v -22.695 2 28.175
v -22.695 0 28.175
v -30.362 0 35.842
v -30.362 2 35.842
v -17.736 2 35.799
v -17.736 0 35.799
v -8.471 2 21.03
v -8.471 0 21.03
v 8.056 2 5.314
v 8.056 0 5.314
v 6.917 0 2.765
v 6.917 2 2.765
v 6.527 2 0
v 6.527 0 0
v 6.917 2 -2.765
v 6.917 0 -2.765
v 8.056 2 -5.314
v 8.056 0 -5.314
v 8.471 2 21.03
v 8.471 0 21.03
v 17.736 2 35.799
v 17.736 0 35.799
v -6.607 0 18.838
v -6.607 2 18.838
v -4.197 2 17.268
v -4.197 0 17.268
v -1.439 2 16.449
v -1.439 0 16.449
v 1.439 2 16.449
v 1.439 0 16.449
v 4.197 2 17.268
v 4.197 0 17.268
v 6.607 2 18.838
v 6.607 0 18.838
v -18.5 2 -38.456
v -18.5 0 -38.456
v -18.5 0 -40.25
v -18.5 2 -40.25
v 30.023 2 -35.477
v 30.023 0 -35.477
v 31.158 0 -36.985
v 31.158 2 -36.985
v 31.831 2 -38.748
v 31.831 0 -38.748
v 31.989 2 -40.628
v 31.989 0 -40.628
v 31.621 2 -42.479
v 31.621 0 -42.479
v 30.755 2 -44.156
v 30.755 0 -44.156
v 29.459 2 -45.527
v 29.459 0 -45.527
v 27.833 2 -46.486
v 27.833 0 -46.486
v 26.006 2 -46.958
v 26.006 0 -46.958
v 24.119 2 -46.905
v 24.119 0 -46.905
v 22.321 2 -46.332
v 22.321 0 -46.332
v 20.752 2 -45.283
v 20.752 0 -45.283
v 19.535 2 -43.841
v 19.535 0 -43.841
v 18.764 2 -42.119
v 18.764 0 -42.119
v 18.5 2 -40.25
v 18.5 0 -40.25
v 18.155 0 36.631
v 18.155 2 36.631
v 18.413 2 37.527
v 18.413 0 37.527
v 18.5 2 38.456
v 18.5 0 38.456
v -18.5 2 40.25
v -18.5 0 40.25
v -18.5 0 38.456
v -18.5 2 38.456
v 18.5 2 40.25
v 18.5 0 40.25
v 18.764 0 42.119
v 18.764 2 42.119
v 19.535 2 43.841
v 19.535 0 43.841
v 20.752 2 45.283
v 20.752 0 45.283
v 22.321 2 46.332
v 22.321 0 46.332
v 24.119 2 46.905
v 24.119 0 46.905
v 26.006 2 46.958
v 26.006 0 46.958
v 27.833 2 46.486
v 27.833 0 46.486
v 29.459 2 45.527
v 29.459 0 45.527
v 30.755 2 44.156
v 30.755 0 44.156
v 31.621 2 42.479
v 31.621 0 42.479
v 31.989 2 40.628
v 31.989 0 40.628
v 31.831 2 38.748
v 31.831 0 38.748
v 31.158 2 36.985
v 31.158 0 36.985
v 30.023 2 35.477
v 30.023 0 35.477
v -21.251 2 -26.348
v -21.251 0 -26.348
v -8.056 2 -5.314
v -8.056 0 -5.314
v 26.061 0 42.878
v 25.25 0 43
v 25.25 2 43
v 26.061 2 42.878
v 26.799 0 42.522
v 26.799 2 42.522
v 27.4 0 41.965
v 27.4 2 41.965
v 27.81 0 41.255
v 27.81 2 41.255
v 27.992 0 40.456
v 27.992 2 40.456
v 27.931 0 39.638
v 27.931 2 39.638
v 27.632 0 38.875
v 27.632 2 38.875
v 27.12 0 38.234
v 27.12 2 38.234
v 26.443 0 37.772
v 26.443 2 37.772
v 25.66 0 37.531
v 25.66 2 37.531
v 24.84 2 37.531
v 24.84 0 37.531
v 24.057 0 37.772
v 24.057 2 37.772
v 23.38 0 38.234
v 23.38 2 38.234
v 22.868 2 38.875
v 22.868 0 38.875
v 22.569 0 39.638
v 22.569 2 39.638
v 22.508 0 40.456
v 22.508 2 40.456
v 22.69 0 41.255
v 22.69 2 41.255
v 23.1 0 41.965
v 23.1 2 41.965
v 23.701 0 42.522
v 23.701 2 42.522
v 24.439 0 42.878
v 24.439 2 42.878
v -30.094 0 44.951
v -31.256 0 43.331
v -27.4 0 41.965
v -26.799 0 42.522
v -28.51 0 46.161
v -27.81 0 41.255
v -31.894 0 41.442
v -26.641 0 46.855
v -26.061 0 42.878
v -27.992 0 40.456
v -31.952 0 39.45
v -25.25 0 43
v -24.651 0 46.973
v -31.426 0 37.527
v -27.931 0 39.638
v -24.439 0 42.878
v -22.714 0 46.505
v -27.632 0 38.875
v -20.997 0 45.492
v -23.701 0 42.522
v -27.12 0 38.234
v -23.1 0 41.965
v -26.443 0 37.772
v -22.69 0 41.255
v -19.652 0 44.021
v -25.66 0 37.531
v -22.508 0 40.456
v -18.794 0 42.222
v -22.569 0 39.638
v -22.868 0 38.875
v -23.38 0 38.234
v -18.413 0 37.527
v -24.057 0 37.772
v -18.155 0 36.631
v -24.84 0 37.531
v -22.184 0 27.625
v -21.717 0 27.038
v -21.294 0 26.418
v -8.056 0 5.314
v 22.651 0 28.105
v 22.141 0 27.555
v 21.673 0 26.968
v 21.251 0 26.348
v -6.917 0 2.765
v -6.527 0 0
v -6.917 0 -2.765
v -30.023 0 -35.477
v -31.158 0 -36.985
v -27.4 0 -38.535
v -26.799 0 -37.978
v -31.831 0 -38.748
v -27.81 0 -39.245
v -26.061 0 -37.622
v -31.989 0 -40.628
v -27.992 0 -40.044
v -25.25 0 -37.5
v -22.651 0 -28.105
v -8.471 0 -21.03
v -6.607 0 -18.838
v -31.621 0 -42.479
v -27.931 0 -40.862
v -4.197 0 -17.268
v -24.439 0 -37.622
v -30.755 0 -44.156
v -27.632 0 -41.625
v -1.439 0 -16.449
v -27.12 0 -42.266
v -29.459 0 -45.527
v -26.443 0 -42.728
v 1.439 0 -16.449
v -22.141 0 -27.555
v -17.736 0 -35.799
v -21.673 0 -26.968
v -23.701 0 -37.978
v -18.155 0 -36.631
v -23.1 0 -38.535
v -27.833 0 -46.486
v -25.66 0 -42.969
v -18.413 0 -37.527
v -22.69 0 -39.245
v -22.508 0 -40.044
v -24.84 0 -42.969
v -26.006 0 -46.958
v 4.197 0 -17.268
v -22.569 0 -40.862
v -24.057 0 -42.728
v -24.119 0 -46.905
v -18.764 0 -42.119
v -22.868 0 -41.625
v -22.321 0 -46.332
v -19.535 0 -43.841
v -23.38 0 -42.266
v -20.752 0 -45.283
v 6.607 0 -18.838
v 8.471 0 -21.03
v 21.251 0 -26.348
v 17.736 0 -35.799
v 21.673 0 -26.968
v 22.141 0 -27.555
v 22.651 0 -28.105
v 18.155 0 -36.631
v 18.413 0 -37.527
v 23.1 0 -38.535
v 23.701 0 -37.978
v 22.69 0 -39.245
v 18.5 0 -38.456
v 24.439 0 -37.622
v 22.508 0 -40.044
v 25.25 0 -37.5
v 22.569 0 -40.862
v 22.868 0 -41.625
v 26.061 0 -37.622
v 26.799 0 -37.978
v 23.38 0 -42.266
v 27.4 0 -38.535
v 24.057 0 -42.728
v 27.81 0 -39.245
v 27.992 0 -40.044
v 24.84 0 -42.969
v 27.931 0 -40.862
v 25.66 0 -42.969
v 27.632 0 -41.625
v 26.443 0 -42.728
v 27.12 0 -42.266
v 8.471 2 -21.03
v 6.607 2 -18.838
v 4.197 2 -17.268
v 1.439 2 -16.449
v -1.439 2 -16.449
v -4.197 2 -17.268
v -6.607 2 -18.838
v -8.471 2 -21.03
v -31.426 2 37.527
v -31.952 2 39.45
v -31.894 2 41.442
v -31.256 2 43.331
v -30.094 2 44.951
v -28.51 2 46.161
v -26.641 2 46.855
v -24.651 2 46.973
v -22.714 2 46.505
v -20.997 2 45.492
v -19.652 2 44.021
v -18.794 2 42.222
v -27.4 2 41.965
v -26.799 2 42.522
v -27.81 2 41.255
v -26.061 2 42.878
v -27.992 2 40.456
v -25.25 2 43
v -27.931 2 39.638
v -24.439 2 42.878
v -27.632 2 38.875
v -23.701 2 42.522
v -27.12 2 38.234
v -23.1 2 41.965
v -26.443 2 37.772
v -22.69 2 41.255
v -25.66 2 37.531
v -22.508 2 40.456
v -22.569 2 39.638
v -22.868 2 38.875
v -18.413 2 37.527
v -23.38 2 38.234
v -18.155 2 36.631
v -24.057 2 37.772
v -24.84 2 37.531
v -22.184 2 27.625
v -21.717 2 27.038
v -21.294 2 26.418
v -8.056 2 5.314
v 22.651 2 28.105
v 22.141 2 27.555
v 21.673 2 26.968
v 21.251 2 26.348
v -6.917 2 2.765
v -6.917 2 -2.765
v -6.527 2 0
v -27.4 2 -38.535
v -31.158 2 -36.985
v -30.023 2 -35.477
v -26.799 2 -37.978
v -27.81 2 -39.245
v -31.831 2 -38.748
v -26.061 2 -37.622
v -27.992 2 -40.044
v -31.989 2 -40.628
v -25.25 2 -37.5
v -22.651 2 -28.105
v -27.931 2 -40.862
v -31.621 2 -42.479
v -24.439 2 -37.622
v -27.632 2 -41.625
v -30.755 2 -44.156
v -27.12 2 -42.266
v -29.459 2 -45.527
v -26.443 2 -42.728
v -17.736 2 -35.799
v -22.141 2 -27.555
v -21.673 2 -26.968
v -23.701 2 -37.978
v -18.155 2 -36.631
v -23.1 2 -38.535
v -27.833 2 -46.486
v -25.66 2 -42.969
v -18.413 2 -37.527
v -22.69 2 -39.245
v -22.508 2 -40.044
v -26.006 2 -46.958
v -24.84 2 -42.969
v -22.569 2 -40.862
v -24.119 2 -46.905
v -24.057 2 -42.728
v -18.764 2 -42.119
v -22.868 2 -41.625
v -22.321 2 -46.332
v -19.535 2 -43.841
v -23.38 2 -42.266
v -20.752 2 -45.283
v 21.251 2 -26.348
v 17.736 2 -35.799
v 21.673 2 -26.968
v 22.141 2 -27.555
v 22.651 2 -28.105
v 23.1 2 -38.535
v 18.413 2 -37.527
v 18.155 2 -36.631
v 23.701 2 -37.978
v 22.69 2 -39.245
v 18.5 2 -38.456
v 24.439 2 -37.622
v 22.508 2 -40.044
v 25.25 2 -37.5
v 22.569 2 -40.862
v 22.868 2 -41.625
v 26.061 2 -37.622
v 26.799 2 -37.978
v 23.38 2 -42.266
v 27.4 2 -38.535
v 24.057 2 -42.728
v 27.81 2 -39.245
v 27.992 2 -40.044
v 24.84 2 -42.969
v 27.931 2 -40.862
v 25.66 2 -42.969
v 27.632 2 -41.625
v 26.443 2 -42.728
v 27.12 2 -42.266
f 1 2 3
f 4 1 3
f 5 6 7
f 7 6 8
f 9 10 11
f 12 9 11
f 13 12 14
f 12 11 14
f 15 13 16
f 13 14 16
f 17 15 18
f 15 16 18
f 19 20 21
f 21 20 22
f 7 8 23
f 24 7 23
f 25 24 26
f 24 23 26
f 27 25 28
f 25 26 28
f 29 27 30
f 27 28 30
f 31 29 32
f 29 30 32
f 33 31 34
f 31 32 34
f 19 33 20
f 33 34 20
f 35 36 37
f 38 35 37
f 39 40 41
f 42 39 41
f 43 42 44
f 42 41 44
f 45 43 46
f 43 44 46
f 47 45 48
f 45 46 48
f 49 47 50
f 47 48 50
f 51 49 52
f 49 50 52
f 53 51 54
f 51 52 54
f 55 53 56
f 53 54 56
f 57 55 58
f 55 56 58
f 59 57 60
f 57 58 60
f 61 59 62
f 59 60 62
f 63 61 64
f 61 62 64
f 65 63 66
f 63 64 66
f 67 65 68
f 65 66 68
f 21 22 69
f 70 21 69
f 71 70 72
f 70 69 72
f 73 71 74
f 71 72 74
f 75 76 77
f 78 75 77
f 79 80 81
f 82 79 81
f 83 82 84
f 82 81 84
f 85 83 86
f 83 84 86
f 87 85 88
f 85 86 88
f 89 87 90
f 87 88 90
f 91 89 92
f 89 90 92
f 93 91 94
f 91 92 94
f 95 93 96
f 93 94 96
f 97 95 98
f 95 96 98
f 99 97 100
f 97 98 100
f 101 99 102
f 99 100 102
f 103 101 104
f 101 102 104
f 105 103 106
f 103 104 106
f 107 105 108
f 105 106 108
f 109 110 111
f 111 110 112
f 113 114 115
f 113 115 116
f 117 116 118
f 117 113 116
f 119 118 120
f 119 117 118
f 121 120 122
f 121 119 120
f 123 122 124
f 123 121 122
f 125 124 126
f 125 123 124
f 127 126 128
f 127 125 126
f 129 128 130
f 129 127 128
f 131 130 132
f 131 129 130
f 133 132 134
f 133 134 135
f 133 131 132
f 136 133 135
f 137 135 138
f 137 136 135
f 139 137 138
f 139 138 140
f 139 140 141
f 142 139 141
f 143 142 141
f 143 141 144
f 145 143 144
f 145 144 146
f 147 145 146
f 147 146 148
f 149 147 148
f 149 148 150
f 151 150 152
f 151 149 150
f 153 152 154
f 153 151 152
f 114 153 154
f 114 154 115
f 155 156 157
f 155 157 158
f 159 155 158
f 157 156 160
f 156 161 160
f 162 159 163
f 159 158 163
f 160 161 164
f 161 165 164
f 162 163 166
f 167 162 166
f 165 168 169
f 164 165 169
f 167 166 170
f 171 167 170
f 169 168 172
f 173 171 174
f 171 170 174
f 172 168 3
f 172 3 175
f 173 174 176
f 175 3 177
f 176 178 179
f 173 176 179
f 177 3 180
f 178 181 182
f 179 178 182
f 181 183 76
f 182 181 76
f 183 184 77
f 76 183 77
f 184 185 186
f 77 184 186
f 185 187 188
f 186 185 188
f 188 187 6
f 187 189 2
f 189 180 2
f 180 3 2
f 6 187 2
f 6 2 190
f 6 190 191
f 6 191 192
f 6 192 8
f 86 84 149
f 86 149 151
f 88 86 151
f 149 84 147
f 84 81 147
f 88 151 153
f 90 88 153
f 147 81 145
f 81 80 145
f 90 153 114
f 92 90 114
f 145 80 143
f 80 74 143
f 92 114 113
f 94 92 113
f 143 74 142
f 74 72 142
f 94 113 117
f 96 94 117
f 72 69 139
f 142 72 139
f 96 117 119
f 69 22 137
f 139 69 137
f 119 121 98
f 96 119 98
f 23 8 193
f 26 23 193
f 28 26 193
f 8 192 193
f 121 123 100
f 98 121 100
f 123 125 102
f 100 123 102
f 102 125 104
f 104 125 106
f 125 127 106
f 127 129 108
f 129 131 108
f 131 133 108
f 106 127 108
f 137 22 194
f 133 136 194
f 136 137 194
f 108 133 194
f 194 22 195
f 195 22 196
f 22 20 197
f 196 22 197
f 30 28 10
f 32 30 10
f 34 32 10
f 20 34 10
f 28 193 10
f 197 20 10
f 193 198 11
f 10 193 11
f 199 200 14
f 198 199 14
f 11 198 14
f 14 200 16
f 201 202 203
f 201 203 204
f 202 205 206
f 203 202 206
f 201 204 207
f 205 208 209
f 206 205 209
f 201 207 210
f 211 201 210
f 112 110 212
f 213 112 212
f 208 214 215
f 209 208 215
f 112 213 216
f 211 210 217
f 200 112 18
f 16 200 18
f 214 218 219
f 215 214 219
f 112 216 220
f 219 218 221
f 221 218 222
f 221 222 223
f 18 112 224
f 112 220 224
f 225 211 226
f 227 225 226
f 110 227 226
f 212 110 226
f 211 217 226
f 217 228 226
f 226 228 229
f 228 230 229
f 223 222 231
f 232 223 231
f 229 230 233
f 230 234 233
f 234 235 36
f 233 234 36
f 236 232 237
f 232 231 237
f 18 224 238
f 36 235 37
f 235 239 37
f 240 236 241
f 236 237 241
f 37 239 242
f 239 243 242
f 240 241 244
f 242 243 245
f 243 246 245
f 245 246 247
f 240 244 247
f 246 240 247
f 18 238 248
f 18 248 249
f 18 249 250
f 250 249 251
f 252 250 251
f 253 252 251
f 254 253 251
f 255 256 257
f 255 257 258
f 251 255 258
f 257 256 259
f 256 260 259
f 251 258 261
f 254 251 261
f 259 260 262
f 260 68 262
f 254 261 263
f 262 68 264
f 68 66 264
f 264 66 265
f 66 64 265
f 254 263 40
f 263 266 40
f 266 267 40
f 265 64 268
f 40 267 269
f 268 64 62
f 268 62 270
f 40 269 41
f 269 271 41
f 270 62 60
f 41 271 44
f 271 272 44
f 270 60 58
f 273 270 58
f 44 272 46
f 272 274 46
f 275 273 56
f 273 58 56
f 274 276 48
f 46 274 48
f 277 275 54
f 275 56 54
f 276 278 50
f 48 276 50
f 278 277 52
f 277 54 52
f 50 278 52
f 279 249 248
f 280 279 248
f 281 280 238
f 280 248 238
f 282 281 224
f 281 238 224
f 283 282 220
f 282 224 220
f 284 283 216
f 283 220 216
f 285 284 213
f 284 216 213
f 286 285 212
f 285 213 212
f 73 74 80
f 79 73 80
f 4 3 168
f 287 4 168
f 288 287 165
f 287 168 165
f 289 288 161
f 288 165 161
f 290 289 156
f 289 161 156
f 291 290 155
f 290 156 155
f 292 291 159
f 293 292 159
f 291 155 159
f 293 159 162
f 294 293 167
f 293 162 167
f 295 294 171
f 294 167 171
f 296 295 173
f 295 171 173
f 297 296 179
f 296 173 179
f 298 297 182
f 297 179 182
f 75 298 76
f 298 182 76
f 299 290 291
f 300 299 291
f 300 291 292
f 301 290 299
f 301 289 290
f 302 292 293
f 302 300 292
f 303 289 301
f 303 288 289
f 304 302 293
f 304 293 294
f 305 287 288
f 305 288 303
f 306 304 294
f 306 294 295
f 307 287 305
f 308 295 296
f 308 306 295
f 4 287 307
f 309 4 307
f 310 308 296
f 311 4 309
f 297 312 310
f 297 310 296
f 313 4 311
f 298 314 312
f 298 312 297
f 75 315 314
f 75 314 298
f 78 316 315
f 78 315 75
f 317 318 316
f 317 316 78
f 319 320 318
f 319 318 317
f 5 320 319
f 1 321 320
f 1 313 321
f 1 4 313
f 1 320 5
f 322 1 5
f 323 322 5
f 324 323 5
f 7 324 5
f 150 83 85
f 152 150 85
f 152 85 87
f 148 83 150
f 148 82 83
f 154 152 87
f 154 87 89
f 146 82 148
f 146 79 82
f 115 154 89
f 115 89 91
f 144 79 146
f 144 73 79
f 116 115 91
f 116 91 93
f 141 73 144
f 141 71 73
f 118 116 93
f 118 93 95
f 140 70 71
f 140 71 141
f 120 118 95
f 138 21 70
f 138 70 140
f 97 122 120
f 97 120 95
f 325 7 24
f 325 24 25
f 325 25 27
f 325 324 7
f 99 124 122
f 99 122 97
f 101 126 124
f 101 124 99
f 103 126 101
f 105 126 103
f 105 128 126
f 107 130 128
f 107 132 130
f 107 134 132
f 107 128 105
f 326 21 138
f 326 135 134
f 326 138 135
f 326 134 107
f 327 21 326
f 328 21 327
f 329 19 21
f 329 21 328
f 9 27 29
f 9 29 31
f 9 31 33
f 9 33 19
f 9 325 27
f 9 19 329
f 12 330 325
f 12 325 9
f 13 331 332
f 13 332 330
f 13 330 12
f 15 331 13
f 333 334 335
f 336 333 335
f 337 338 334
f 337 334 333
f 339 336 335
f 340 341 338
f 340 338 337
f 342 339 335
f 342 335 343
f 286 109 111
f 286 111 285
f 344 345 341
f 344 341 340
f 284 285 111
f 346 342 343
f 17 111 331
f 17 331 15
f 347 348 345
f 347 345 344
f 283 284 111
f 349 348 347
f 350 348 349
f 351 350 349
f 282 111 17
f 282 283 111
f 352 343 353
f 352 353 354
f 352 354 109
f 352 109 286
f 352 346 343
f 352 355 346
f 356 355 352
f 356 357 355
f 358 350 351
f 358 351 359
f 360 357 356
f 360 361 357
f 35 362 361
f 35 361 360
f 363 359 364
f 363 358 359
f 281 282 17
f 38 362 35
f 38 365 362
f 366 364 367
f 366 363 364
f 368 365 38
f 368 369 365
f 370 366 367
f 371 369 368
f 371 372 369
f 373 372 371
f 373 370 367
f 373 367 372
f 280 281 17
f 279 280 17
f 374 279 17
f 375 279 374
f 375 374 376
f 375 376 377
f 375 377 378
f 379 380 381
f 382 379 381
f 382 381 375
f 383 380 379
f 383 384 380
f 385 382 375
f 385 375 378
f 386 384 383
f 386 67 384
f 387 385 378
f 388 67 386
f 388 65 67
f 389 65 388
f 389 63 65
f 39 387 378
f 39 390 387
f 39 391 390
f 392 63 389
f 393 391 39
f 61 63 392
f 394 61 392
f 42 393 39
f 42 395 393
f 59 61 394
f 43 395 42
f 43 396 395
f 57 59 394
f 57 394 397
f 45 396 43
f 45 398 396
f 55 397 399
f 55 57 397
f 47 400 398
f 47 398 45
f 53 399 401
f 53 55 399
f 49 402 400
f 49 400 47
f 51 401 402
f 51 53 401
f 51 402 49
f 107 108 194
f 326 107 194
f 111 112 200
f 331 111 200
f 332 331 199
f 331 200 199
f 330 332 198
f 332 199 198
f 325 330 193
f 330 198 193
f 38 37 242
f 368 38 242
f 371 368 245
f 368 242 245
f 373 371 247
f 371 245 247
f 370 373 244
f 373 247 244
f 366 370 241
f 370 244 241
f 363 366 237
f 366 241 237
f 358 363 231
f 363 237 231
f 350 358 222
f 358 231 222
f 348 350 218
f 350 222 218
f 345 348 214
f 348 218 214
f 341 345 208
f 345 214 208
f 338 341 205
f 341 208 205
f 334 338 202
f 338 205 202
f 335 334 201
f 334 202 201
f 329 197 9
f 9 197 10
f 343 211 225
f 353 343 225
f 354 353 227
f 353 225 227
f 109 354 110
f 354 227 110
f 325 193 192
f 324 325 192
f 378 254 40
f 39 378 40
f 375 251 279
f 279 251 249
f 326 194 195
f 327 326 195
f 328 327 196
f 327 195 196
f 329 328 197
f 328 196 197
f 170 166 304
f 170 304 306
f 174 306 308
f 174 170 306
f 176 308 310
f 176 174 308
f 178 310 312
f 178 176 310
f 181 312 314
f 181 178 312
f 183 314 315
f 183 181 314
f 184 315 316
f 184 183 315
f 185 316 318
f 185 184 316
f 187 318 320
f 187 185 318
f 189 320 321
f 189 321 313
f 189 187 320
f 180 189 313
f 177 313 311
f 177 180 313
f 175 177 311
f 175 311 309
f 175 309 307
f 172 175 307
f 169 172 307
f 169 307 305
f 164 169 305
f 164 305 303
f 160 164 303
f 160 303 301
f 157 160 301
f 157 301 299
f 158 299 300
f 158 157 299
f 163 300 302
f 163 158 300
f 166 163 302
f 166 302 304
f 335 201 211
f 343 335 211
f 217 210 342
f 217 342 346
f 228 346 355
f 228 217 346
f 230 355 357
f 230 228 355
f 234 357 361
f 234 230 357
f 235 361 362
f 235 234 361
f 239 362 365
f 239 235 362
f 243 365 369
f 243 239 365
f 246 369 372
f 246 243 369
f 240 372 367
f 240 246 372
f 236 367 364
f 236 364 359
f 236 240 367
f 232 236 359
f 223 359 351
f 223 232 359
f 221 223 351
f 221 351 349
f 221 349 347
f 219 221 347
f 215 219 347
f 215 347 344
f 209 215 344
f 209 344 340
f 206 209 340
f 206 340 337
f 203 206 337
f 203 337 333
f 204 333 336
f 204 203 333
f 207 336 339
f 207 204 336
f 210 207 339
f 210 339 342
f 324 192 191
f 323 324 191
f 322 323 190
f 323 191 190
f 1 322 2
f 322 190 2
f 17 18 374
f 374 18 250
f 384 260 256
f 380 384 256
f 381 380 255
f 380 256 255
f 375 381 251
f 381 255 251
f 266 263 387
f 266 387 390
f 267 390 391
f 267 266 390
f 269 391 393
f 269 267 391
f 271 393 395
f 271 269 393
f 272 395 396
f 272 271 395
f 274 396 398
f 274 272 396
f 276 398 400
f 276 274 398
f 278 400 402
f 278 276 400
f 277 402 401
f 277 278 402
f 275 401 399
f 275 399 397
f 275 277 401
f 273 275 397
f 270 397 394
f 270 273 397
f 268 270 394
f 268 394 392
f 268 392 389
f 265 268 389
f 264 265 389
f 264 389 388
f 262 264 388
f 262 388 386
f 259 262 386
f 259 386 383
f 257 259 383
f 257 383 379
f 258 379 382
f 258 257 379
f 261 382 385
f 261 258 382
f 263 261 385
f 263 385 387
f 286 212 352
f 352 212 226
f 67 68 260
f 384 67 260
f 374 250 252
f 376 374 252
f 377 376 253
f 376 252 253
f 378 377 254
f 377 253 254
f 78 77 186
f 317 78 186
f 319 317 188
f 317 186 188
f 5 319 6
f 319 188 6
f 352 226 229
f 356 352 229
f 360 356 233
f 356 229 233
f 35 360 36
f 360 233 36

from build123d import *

# Parameters (mm, degrees)
SKETCH1_R           = 2.75
BOSS_EXTRUDE1_DEPTH = 2


with BuildPart() as part:
    # Sketch1 → Boss-Extrude1 (new body)
    with BuildSketch(Plane(origin=(0, 0, 0), x_dir=(1, 0, 0), z_dir=(0, 1, 0))):
        with BuildLine():
            ThreePointArc((-22.650842333, 28.104900787), (-21.901331942, 27.26589175), (-21.250806764, 26.34800342))
            Line((-21.250806764, 26.34800342), (-8.055669308, 5.314170444))
            ThreePointArc((-8.055669308, 5.314170444), (-6.526772689, 0), (-8.055669308, -5.314170444))
            Line((-8.055669308, -5.314170444), (-21.294498712, -26.41765098))
            ThreePointArc((-21.294498712, -26.41765098), (-21.94502389, -27.33553931), (-22.694534281, -28.174548348))
            Line((-22.694534281, -28.174548348), (-30.36172718, -35.841741247))
            ThreePointArc((-30.36172718, -35.841741247), (-27.601418884, -46.577189679), (-18.5, -40.25))
            Line((-18.5, -40.25), (-18.5, -38.455653201))
            ThreePointArc((-18.5, -38.455653201), (-18.305088888, -37.073220282), (-17.735551691, -35.798567979))
            Line((-17.735551691, -35.798567979), (-8.471103381, -21.03048701))
            ThreePointArc((-8.471103381, -21.03048701), (0, -16.344657454), (8.471103381, -21.03048701))
            Line((8.471103381, -21.03048701), (17.735551691, -35.798567979))
            ThreePointArc((17.735551691, -35.798567979), (18.305088888, -37.073220282), (18.5, -38.455653201))
            Line((18.5, -38.455653201), (18.5, -40.25))
            ThreePointArc((18.5, -40.25), (27.833113168, -46.486186844), (30.022970773, -35.477029227))
            Line((30.022970773, -35.477029227), (22.650842334, -28.104900787))
            ThreePointArc((22.650842334, -28.104900787), (21.901331942, -27.26589175), (21.250806764, -26.34800342))
            Line((21.250806764, -26.34800342), (8.055669308, -5.314170444))
            ThreePointArc((8.055669308, -5.314170444), (6.526772689, 0), (8.055669308, 5.314170444))
            Line((8.055669308, 5.314170444), (21.250806764, 26.34800342))
            ThreePointArc((21.250806764, 26.34800342), (21.901331942, 27.26589175), (22.650842333, 28.104900787))
            Line((22.650842333, 28.104900787), (30.022970773, 35.477029227))
            ThreePointArc((30.022970773, 35.477029227), (27.833113168, 46.486186844), (18.5, 40.25))
            Line((18.5, 40.25), (18.5, 38.455653201))
            ThreePointArc((18.5, 38.455653201), (18.305088888, 37.073220282), (17.735551691, 35.798567979))
            Line((17.735551691, 35.798567979), (8.471103381, 21.03048701))
            ThreePointArc((8.471103381, 21.03048701), (0, 16.344657454), (-8.471103381, 21.03048701))
            Line((-8.471103381, 21.03048701), (-17.735551691, 35.798567979))
            ThreePointArc((-17.735551691, 35.798567979), (-18.305088889, 37.073220282), (-18.5, 38.455653201))
            Line((-18.5, 38.455653201), (-18.5, 40.25))
            ThreePointArc((-18.5, 40.25), (-27.833113168, 46.486186844), (-30.022970773, 35.477029227))
            Line((-30.022970773, 35.477029227), (-22.650842333, 28.104900787))
        make_face()
        with Locations(Location((-25.25, -40.25, 0), (0, 0, 270))):
            Circle(SKETCH1_R, mode=Mode.SUBTRACT)
        with Locations(Location((-25.25, 40.25, 0), (0, 0, 270))):
            Circle(SKETCH1_R, mode=Mode.SUBTRACT)
        with Locations(Location((25.25, 40.25, 0), (0, 0, 270))):
            Circle(SKETCH1_R, mode=Mode.SUBTRACT)
        with Locations(Location((25.25, -40.25, 0), (0, 0, 270))):
            Circle(SKETCH1_R, mode=Mode.SUBTRACT)
    extrude(amount=BOSS_EXTRUDE1_DEPTH)


solid = part.part
